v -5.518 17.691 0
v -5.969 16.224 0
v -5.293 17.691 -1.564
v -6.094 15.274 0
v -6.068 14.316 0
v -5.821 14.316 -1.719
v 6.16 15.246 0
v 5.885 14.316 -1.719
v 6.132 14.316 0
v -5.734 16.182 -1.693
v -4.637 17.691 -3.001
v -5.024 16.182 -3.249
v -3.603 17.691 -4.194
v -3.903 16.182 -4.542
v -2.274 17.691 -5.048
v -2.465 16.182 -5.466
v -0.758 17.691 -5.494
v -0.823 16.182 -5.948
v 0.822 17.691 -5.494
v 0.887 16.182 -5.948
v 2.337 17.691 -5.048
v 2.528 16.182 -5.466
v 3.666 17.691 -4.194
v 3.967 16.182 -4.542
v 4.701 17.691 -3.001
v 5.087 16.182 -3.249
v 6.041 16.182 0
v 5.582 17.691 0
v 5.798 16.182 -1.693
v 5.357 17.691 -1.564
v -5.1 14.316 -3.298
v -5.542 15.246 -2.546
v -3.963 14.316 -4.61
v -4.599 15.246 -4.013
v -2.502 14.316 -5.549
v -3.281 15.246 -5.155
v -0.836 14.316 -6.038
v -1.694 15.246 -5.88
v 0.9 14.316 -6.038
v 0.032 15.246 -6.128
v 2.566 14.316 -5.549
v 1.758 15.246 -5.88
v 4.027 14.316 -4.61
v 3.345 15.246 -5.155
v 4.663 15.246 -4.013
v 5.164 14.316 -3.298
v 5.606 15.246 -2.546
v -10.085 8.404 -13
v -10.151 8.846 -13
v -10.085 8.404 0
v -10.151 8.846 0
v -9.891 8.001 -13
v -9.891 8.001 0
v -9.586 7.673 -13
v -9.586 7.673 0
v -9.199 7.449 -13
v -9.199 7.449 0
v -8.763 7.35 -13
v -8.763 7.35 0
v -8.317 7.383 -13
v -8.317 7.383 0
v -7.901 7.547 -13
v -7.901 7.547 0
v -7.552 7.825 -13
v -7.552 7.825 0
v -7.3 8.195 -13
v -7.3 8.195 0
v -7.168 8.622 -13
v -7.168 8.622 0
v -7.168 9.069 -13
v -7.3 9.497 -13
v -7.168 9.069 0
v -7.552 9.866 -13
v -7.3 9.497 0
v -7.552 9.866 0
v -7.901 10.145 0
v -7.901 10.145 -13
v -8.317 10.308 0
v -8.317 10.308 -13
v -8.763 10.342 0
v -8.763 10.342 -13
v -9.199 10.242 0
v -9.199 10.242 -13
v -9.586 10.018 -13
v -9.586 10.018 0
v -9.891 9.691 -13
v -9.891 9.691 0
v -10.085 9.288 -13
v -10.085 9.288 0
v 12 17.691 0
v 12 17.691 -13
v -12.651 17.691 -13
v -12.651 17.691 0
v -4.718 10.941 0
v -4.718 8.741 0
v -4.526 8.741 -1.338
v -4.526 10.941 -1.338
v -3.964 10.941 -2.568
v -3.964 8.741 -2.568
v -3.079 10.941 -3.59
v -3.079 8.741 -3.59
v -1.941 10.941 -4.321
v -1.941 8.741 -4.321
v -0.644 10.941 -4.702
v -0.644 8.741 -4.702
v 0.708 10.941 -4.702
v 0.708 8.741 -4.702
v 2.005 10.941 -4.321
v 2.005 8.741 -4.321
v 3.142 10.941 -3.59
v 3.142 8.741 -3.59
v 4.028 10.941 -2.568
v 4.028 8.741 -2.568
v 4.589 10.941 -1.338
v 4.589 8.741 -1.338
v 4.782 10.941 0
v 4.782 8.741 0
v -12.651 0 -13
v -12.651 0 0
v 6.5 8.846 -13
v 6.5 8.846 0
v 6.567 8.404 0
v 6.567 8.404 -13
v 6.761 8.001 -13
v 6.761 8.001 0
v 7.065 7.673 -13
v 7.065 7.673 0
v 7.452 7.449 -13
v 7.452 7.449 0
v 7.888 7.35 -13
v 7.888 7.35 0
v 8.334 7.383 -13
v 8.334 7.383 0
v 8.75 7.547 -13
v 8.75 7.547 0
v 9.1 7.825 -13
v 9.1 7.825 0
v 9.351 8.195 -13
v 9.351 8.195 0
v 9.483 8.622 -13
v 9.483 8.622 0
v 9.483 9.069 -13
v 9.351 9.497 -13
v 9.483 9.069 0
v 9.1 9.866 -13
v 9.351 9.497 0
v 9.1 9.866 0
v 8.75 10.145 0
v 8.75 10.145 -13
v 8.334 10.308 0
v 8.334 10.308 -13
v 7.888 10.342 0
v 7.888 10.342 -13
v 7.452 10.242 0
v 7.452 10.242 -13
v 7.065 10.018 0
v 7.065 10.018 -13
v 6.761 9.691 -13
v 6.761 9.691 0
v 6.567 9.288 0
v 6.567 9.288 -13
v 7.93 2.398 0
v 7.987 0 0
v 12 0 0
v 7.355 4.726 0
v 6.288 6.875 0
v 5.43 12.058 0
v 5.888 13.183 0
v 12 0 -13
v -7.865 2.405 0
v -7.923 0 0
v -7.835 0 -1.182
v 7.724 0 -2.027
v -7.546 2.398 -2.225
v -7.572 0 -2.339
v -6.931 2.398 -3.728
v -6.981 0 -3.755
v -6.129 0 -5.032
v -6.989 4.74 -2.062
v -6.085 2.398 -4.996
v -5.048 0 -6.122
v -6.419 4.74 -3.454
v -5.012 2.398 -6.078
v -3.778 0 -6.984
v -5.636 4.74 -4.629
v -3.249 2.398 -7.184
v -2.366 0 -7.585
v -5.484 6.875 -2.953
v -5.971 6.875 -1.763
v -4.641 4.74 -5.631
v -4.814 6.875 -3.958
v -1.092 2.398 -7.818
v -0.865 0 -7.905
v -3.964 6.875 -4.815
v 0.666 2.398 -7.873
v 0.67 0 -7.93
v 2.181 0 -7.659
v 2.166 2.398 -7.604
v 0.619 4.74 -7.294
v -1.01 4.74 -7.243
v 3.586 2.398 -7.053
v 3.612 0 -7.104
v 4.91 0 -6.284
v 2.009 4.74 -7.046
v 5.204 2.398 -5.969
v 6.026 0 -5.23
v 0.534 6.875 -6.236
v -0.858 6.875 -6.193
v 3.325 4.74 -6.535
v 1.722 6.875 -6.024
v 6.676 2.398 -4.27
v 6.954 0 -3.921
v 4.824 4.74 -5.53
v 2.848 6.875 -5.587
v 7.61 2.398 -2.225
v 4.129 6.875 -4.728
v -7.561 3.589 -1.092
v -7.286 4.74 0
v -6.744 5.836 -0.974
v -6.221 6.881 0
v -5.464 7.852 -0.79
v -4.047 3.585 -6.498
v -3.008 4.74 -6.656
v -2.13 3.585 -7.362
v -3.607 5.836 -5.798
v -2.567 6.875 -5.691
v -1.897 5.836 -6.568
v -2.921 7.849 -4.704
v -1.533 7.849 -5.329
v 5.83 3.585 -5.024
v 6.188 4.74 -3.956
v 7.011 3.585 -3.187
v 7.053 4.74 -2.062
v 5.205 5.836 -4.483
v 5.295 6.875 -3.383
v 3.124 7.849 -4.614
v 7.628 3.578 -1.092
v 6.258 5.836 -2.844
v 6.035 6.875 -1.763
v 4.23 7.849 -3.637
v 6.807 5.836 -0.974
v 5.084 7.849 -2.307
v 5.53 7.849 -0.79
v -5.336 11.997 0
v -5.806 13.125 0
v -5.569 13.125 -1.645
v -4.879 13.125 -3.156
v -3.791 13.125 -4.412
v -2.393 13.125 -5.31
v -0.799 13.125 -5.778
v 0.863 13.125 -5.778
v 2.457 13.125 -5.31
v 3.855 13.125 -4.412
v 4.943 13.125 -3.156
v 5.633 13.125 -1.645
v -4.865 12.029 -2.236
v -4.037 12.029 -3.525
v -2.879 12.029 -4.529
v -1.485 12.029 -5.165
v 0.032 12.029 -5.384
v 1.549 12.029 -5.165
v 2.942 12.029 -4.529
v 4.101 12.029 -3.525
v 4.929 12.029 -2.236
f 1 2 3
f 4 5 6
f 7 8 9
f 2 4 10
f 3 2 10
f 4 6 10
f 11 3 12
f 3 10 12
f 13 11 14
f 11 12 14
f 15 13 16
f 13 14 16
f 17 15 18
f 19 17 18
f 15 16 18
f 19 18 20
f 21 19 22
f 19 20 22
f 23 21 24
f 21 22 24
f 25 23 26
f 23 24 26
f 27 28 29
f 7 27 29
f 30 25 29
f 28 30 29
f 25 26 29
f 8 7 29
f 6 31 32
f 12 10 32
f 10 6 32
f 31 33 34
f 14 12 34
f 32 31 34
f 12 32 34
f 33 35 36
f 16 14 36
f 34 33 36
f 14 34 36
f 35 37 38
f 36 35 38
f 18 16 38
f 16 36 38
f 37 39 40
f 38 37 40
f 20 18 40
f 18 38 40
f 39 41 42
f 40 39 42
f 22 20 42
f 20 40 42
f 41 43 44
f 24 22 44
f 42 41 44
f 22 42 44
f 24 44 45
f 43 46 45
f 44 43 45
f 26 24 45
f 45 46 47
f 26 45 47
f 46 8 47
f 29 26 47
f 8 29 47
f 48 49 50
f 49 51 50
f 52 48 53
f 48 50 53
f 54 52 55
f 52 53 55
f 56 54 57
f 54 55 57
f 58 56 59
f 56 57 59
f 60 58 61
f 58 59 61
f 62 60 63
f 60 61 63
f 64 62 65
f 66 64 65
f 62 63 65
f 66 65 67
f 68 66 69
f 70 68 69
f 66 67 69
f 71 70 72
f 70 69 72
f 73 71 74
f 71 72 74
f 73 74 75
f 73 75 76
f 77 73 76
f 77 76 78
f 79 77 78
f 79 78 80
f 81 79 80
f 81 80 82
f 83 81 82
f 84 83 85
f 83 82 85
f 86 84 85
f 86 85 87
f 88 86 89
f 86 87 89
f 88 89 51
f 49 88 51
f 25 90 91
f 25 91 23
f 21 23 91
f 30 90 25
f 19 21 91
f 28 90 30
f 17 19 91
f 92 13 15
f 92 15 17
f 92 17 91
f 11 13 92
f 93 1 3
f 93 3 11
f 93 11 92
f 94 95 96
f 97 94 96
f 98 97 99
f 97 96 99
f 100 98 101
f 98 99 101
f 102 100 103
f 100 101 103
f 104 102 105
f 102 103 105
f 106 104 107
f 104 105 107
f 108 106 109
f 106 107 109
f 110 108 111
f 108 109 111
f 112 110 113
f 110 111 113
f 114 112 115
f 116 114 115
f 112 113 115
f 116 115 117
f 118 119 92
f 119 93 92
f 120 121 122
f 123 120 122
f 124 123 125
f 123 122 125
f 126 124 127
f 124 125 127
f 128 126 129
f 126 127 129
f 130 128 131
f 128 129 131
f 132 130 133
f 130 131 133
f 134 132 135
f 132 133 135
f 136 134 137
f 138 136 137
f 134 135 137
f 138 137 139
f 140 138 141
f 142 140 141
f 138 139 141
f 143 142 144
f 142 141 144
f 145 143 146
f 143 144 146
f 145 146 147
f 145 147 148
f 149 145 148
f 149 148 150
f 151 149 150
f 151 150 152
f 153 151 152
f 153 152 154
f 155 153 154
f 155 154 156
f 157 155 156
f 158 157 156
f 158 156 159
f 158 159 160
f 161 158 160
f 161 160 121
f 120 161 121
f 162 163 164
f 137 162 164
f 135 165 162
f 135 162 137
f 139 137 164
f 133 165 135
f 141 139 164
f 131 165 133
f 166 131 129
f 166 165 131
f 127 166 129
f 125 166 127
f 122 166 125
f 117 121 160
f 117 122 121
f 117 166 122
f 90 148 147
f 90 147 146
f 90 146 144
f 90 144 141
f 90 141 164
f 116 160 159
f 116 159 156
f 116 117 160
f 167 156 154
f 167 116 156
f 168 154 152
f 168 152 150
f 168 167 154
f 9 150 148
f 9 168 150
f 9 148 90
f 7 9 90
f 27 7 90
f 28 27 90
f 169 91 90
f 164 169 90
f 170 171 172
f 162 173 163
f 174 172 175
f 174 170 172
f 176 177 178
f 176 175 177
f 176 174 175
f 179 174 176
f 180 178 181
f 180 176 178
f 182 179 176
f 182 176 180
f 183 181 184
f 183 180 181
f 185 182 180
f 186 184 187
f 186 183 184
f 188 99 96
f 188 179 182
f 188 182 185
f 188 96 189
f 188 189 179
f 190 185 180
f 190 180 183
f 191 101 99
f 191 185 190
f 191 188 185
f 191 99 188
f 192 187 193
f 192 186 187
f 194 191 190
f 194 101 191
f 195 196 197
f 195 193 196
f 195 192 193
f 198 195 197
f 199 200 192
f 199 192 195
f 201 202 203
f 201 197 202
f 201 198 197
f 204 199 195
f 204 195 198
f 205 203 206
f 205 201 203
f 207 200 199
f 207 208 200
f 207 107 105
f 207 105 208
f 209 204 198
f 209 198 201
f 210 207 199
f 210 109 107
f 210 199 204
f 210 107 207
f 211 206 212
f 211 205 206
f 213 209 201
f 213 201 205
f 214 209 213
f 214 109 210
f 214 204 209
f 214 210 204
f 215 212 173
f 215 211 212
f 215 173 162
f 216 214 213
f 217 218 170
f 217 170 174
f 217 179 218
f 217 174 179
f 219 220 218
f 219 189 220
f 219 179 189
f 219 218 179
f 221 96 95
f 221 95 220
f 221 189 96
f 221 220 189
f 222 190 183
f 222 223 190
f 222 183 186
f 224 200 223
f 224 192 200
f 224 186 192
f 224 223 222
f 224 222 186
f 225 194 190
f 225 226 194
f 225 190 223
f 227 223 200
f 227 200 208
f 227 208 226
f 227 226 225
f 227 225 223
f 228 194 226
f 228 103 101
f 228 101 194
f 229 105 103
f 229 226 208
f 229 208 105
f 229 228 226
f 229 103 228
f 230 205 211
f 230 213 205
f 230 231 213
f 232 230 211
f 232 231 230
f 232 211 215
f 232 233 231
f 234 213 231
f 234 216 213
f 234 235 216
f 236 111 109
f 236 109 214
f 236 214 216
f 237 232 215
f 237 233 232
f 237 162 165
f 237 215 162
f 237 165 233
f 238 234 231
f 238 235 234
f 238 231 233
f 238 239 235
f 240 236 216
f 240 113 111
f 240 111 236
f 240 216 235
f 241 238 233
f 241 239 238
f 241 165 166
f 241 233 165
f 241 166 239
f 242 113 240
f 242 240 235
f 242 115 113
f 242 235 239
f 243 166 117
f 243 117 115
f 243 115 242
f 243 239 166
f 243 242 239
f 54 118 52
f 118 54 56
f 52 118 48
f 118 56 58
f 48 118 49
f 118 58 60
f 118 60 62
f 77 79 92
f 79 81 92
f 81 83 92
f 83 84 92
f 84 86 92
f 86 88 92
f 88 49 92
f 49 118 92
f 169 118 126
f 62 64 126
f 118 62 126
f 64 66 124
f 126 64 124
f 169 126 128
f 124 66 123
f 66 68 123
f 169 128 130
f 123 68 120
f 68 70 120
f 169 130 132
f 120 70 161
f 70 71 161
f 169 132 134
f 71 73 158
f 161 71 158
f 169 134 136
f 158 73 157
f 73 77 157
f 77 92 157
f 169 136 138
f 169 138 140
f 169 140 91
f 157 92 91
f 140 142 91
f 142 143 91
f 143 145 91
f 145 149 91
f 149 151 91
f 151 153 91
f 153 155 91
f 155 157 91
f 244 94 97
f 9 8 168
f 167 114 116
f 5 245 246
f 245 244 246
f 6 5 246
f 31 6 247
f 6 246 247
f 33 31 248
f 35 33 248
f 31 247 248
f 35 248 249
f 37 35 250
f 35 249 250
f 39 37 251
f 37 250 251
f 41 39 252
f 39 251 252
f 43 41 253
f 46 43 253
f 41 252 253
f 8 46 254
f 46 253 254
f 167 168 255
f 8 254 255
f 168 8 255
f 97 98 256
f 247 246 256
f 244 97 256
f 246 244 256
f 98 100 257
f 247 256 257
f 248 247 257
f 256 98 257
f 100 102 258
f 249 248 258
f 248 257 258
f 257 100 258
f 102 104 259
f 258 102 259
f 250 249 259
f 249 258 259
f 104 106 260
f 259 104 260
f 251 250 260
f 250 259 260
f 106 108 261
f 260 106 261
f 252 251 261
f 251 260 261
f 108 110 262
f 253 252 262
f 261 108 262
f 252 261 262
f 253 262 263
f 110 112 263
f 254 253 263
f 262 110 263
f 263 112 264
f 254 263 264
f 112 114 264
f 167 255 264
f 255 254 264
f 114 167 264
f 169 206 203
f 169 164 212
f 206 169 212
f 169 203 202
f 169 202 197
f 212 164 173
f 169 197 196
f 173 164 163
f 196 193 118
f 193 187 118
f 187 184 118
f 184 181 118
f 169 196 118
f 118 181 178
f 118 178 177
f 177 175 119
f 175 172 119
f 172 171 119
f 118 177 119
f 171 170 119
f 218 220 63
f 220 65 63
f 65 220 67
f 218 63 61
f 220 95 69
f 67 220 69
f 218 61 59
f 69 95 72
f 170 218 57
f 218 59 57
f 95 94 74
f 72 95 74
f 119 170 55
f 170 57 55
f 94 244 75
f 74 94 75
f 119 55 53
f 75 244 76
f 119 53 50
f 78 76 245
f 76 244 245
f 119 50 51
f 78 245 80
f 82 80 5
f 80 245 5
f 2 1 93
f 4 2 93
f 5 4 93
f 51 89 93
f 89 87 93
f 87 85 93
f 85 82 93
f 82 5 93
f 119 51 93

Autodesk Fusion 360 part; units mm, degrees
sketch "Sketch1" plane through (0, 0, 0) normal (0, 0, 1) x (1, 0, 0)
  line L0 (0.0319, -0.0588) -> (7.7319, -0.0588)
  line L1 (0.0319, 17.6912) -> (0.0319, -0.0588)
  line L2 (0.0319, 17.6912) -> (5.3319, 17.6912)
  line L3 (0.0319, 8.7412) -> (4.5319, 8.7412)
  line L4 (4.5319, 10.9412) -> (0.0319, 10.9412)
  spline S0 degree 5 poles (5.3319, 17.6912) (5.3878, 17.5532) (5.4935, 17.2775) (5.633, 16.8647) (5.7805, 16.3159) (5.8962, 15.6328) (5.9374, 14.9527) (5.8981, 14.2761) (5.7753, 13.6028) (5.5729, 12.9329) (5.297, 12.2661) (5.0223, 11.7348) (4.7879, 11.3376) (4.6193, 11.0732) (4.5319, 10.9412) knots 0 0 0 0 0 0 0.1 0.2 0.3 0.4 0.5 0.6 0.7 0.8 0.9 1 1 1 1 1 1
  line L5 (0.0319, 10.9412) -> (4.5319, 10.9412)
  arc A0 (7.7319, -0.0588) -> (4.5319, 8.7412) centre (-3.0926, 0.9869) ccw
  line L6 (4.5319, 8.7412) -> (4.5319, 10.9412)
  line L7 (0.0319, 10.9412) -> (0.0319, 8.7412)
  line L8 (0.0319, 10.9412) -> (0.0319, 8.7412)
  line L9 (0.0319, 14.3162) -> (5.8819, 14.3162)
  line L10 (0.0319, 17.6912) -> (0.0319, 10.9412)
  line L11 (7.7319, -0.0588) -> (7.9819, -0.0588)
  line L12 (4.5319, 8.7412) -> (4.7819, 8.7412)
  line L13 (4.5319, 10.9412) -> (4.7819, 10.9412)
  line L14 (5.8819, 14.3162) -> (6.1319, 14.3162)
  line L15 (5.3319, 17.6912) -> (5.5819, 17.6912)
  spline S1 degree 5 poles (5.5819, 17.6912) (5.6378, 17.5532) (5.7435, 17.2775) (5.883, 16.8647) (6.0305, 16.3159) (6.1462, 15.6328) (6.1874, 14.9527) (6.1481, 14.2761) (6.0253, 13.6028) (5.8229, 12.9329) (5.547, 12.2661) (5.2723, 11.7348) (5.0379, 11.3376) (4.8693, 11.0732) (4.7819, 10.9412) knots 0 0 0 0 0 0 0.1 0.2 0.3 0.4 0.5 0.6 0.7 0.8 0.9 1 1 1 1 1 1
  line L16 (4.7819, 10.9412) -> (4.7819, 8.7412)
  arc A1 (7.9819, -0.0588) -> (4.7819, 8.7412) centre (-2.9749, 0.9388) ccw
  line L17 (5.5819, 17.6912) -> (9, 17.6912)
  line L18 (9, 17.6912) -> (12, 17.6912)
  line L19 (12, 17.6912) -> (12, 0)
  line L20 (12, 0) -> (7.9819, -0.0588)
  dimension "d1" = 5.3
  dimension "d2" = 6.75
  dimension "d3" = 4.5
  dimension "d4" = 5.85
  dimension "d5" = 7.7
  dimension "d6" = 11
  dimension "d7" = 2.2
  dimension "d8" = 0.25
  dimension "d9" = 0.25
  dimension "d10" = 0.25
  dimension "d11" = 0.25
  dimension "d12" = 0.25
revolve "Revolve1" add sketch "Sketch1" angle 360 about axis through (0.0319, 17.6912, 0) along (0, -1, 0) contours S1 L16 A1 L17 L18 L19 L20
sketch "Sketch2" plane through (0, 0, 0) normal (1, 0, 0) x (0, 1, 0)
  line L0 (25.8736, 15.4962) -> (-4, 15.4962)
  line L1 (-4, 15.4962) -> (-4, 0)
  line L2 (-4, 0) -> (25.8736, 0)
  line L3 (25.8736, 0) -> (25.8736, 15.4962)
extrude "Extrude1" cut sketch "Sketch2" along normal mid plane 100
sketch "Sketch3" plane through (0, 17.6912, 0) normal (0, 1, 0) x (-1, 0, 0)
  line L0 (11.9363, 0) -> (5.5181, 0)
  arc A0 (-5.5819, 0) -> (5.5181, 0) centre (-0.0319, 0) ccw
  line L1 (-5.5819, 0) -> (-12, 0)
  arc A1 (-12, 0) -> (11.9363, 0) centre (-0.0319, 0) ccw
  line L2 (-12, 0) -> (12.6512, 0)
  line L3 (12.6512, 0) -> (12.6512, -13)
  line L4 (12.6512, -13) -> (-12, -13)
  line L5 (-12, -13) -> (-12, 0)
  circle A2 centre (-0.0319, 0) radius 5.55
  dimension "d16" = 13
extrude "Extrude2" add sketch "Sketch3" against normal blind 17.691 contours A1 L2 L3 L4 L5
sketch "Sketch4" plane through (12, 0, 0) normal (1, 0, 0) x (0, 1, 0)
  line L0 (17.6912, -13) -> (17.6912, 0)
  line L1 (17.6912, 0) -> (0.0002, 0)
  line L2 (0.0002, 0) -> (0.0002, -13)
  line L3 (0.0002, -13) -> (17.6912, -13)
  line L4 (0.0002, 0) -> (-2.6841, 0)
  line L5 (-2.6841, 0) -> (-2.6841, -13)
  line L6 (-2.6841, -13) -> (0.0002, -13)
  line L7 (0.0002, -13) -> (0.0002, 0)
extrude "Extrude3" cut sketch "Sketch4" along normal mid plane 200 contours L2 L4 L5 L6 L7
sketch "Sketch5" plane through (0, 0, 0) normal (0, 0, 1) x (-1, 0, 0)
  line L0 (12.6512, -0.0002) -> (7.9234, -0.0002)
  arc A0 (4.7181, -8.7412) -> (7.9234, -0.0002) centre (-3.0386, -0.9388) ccw
  line L1 (4.7181, -8.7412) -> (4.7181, -10.9412)
  spline S0 degree 3 poles (5.5181, -17.6912) (5.7729, -17.0634) (5.9669, -16.3949) (6.1465, -14.9938) (6.1035, -14.3577) (5.7383, -12.6271) (5.1773, -11.6346) (4.7181, -10.9412) knots -0.494391 -0.494391 -0.494391 -0.494391 -0.376445 -0.376445 -0.249507 -0.249507 0 0 0 0
  line L2 (5.5181, -17.6912) -> (12.6512, -17.6912)
  line L3 (12.6512, -17.6912) -> (12.6512, -0.0002)
  line L4 (12.6512, -17.6912) -> (12.6512, -0.0002)
  line L5 (12.6512, -8.8457) -> (-12, -8.8457)
  line L6 (-12, -8.8457) -> (-12, -17.6912)
  circle A1 centre (8.6512, -8.8457) radius 1.5
  circle A2 centre (-8, -8.8457) radius 1.5
  dimension "d21" = 3
  dimension "d22" = 3
  dimension "d23" = 4
  dimension "d24" = 4
extrude "Extrude4" cut sketch "Sketch5" against normal through all contours L5 A2 | L5 A2 | L5 A1 | L5 A1
